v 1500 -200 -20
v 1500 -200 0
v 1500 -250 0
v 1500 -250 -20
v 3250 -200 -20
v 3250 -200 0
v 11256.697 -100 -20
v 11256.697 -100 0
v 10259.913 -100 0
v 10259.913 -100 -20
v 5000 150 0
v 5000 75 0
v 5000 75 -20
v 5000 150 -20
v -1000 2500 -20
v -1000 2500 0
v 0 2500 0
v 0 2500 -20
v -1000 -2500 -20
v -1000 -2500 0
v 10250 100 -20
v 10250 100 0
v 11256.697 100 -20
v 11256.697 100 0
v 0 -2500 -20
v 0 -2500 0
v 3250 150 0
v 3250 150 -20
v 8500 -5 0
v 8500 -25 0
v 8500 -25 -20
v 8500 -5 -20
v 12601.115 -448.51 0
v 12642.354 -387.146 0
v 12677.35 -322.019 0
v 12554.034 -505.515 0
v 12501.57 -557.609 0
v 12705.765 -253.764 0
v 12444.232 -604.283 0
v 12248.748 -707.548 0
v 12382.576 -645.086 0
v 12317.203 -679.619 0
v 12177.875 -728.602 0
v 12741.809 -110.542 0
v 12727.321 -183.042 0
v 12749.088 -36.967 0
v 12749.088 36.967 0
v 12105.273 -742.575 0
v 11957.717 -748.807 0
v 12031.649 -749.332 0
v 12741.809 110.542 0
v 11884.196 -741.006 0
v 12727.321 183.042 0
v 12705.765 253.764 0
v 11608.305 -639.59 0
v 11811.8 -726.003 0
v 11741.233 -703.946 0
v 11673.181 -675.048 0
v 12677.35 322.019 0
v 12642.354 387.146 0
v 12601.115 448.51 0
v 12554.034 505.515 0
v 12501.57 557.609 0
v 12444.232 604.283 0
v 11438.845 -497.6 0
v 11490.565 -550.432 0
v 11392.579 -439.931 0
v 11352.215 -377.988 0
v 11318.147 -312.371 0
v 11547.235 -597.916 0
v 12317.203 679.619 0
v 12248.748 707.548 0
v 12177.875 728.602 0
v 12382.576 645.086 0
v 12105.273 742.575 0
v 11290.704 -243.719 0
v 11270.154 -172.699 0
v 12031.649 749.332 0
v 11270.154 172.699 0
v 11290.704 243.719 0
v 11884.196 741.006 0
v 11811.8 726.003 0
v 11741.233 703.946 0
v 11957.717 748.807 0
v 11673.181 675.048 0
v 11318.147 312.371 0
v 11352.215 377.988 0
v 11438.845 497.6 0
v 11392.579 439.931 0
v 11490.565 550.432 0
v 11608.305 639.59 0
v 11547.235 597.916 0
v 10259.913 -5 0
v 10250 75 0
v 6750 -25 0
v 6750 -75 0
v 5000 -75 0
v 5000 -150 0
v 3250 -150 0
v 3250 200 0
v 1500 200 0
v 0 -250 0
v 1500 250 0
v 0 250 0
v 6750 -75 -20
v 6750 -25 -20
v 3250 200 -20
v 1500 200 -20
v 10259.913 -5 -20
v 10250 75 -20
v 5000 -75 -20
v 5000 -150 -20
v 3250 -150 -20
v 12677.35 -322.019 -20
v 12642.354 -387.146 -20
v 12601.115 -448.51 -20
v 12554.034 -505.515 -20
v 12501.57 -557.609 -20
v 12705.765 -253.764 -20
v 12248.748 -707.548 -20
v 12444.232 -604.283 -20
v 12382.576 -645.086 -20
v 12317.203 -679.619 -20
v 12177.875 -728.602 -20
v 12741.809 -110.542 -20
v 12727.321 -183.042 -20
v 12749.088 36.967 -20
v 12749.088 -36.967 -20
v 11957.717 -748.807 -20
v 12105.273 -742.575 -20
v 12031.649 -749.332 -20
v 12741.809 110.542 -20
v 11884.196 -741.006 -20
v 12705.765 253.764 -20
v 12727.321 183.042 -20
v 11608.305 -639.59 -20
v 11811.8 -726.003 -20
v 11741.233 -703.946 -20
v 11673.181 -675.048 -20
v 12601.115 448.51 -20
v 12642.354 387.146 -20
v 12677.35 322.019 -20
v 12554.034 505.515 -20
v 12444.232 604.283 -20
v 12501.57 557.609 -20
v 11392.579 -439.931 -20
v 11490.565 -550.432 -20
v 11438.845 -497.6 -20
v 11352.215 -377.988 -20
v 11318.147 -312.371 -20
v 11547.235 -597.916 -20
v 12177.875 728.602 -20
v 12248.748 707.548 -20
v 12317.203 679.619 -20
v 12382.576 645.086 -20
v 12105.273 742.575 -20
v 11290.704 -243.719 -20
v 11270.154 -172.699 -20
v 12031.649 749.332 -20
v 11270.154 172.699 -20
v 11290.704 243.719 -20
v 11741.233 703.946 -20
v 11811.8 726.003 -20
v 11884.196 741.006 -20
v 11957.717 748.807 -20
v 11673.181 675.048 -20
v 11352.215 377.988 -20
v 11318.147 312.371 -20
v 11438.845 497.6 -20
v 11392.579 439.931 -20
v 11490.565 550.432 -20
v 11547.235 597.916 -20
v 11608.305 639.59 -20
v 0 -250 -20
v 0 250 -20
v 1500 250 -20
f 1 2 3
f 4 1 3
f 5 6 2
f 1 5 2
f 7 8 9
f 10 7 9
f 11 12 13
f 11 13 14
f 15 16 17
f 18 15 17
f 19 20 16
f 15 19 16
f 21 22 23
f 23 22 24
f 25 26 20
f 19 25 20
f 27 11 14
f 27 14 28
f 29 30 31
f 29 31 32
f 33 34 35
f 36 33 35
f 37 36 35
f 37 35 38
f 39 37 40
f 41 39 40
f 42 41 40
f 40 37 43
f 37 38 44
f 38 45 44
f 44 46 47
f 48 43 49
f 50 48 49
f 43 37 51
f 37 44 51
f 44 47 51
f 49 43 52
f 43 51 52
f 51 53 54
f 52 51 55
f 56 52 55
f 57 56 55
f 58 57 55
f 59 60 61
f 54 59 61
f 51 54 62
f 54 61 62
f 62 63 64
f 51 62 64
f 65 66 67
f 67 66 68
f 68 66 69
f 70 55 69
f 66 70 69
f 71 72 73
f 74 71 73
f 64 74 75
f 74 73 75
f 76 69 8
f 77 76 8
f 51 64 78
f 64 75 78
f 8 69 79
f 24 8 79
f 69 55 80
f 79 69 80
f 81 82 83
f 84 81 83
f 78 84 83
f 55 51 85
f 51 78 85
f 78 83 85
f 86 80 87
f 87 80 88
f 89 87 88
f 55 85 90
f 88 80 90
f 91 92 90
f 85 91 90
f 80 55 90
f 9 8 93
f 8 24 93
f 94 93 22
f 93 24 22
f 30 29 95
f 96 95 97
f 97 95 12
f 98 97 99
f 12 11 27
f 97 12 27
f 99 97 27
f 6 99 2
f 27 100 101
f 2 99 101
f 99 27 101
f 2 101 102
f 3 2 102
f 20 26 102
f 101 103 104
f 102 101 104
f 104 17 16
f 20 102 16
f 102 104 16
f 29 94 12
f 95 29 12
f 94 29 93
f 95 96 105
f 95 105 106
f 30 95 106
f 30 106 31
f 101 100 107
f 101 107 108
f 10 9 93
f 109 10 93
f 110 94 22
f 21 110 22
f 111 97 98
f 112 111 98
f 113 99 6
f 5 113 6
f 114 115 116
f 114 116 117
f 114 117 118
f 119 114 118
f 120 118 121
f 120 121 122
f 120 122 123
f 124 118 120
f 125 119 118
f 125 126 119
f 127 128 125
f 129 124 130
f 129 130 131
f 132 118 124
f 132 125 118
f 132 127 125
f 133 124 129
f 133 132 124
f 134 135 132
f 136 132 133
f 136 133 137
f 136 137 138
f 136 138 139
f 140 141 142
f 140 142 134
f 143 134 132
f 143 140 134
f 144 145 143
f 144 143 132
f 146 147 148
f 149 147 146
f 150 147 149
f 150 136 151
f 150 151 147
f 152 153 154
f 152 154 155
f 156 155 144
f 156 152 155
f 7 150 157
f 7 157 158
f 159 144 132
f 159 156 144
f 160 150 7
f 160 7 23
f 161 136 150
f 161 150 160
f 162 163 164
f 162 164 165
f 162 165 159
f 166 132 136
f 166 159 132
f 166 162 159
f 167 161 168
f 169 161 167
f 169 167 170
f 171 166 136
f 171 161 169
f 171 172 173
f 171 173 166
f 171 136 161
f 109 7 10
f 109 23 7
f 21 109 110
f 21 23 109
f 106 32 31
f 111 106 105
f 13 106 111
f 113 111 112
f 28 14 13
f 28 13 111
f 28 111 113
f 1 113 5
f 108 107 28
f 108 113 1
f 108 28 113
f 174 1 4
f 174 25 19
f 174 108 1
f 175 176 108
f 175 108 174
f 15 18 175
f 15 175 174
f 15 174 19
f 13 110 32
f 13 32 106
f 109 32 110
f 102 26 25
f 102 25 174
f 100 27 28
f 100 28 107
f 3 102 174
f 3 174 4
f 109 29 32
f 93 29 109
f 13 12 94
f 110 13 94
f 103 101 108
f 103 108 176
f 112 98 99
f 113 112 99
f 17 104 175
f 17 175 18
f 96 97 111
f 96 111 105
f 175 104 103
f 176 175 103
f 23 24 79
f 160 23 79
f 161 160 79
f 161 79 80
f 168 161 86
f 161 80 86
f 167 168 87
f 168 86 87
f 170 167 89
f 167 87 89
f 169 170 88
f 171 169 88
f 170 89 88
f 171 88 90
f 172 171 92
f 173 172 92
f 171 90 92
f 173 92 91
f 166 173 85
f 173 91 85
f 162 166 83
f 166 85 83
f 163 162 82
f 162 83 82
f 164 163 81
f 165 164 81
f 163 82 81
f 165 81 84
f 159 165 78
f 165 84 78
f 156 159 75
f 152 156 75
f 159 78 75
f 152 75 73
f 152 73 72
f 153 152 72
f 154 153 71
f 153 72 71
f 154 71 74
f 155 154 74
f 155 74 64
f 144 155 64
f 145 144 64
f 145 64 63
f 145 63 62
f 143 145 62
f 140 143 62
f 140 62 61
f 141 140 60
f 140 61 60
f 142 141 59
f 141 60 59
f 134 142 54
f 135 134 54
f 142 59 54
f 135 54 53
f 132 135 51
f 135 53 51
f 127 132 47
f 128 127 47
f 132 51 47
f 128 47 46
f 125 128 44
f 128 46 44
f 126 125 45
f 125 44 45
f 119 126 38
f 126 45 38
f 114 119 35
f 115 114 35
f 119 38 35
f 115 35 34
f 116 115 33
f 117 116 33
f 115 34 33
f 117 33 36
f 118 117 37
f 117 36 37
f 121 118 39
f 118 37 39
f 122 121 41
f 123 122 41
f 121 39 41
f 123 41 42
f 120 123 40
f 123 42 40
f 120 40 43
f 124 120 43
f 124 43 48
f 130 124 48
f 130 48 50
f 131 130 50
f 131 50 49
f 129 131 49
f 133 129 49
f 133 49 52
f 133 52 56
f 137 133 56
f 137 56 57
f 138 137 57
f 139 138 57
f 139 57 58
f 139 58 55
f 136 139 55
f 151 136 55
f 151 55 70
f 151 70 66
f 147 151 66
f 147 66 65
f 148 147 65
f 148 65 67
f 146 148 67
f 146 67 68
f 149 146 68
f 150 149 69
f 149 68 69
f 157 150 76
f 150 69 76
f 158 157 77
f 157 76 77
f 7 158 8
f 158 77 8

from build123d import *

# Parameters (mm, degrees)
BOSS_EXTRUDE1_DEPTH = 20
SKETCH2_W           = 1000
SKETCH2_H           = 2250
CUT_EXTRUDE1_DEPTH  = 12993.801853334
CUT_EXTRUDE4_DEPTH  = 12993.801853334
SKETCH4_W           = 1750
SKETCH4_H           = 50
CUT_EXTRUDE5_DEPTH  = 12993.801853334
SKETCH5_W           = 1750
SKETCH5_H           = 50
CUT_EXTRUDE6_DEPTH  = 12993.801853334
SKETCH8_W           = 1750
SKETCH8_H           = 100
CUT_EXTRUDE7_DEPTH  = 12993.801853334
SKETCH6_W           = 1750
SKETCH6_H           = 50
CUT_EXTRUDE8_DEPTH  = 12993.801853334
SKETCH9_W           = 1759.91281427
SKETCH9_H           = 120
CUT_EXTRUDE9_DEPTH  = 12993.801853334


with BuildPart() as part:
    # Sketch1 → Boss-Extrude1 (new body)
    with BuildSketch(Plane.XY):
        with BuildLine():
            Line((1000, 250), (5000, 250))
            Line((5000, 250), (5000, 125))
            Line((5000, 125), (9000, 125))
            Line((9000, 125), (9000, 100))
            Line((9000, 100), (11256.696562634, 100))
            ThreePointArc((11256.696562634, 100), (12750, 0), (11256.696562634, -100))
            Line((11256.696562634, -100), (9000, -100))
            Line((9000, -100), (9000, -125))
            Line((9000, -125), (5000, -125))
            Line((5000, -125), (5000, -250))
            Line((5000, -250), (1000, -250))
            Line((1000, -250), (1000, -2500))
            Line((1000, -2500), (-1000, -2500))
            Line((-1000, -2500), (-1000, 2500))
            Line((-1000, 2500), (1000, 2500))
            Line((1000, 2500), (1000, 250))
        make_face()
    extrude(amount=-BOSS_EXTRUDE1_DEPTH)

    # Sketch2 → Cut-Extrude1 (cut, through all)
    with BuildSketch(Plane.XY):
        with Locations((500, 1375)):
            Rectangle(SKETCH2_W, SKETCH2_H)
        with Locations((500, -1375)):
            Rectangle(SKETCH2_W, SKETCH2_H)
    extrude(amount=-CUT_EXTRUDE1_DEPTH, mode=Mode.SUBTRACT)

    # Sketch3 → Cut-Extrude4 (cut, through all)
    with BuildSketch(Plane.XY):
        Polygon((1500, -250), (3250, -250), (5000, -250), (5000, -150), (3250, -150), (3250, -200), (1500, -200), align=None)
    cut_extrude4 = extrude(amount=-CUT_EXTRUDE4_DEPTH, mode=Mode.SUBTRACT)

    # Mirror1: Cut-Extrude4 across plane
    add(cut_extrude4.mirror(Plane.ZX), mode=Mode.SUBTRACT)

    # Sketch4 → Cut-Extrude5 (cut, through all)
    with BuildSketch(Plane.XY):
        with Locations((5875, 100)):
            Rectangle(SKETCH4_W, SKETCH4_H)
    cut_extrude5 = extrude(amount=-CUT_EXTRUDE5_DEPTH, mode=Mode.SUBTRACT)

    # Mirror2: Cut-Extrude5 across plane
    add(cut_extrude5.mirror(Plane.ZX), mode=Mode.SUBTRACT)

    # Sketch5 → Cut-Extrude6 (cut, through all)
    with BuildSketch(Plane.XY):
        with Locations((7625, 100)):
            Rectangle(SKETCH5_W, SKETCH5_H)
    extrude(amount=-CUT_EXTRUDE6_DEPTH, mode=Mode.SUBTRACT)

    # Sketch8 → Cut-Extrude7 (cut, through all)
    with BuildSketch(Plane.XY):
        with Locations((7625, -75)):
            Rectangle(SKETCH8_W, SKETCH8_H)
    extrude(amount=-CUT_EXTRUDE7_DEPTH, mode=Mode.SUBTRACT)

    # Sketch6 → Cut-Extrude8 (cut, through all)
    with BuildSketch(Plane.XY):
        with Locations((9375, 100)):
            Rectangle(SKETCH6_W, SKETCH6_H)
    extrude(amount=-CUT_EXTRUDE8_DEPTH, mode=Mode.SUBTRACT)

    # Sketch9 → Cut-Extrude9 (cut, through all)
    with BuildSketch(Plane.XY):
        with Locations((9379.956407135, -65)):
            Rectangle(SKETCH9_W, SKETCH9_H)
    extrude(amount=-CUT_EXTRUDE9_DEPTH, mode=Mode.SUBTRACT)


solid = part.part
